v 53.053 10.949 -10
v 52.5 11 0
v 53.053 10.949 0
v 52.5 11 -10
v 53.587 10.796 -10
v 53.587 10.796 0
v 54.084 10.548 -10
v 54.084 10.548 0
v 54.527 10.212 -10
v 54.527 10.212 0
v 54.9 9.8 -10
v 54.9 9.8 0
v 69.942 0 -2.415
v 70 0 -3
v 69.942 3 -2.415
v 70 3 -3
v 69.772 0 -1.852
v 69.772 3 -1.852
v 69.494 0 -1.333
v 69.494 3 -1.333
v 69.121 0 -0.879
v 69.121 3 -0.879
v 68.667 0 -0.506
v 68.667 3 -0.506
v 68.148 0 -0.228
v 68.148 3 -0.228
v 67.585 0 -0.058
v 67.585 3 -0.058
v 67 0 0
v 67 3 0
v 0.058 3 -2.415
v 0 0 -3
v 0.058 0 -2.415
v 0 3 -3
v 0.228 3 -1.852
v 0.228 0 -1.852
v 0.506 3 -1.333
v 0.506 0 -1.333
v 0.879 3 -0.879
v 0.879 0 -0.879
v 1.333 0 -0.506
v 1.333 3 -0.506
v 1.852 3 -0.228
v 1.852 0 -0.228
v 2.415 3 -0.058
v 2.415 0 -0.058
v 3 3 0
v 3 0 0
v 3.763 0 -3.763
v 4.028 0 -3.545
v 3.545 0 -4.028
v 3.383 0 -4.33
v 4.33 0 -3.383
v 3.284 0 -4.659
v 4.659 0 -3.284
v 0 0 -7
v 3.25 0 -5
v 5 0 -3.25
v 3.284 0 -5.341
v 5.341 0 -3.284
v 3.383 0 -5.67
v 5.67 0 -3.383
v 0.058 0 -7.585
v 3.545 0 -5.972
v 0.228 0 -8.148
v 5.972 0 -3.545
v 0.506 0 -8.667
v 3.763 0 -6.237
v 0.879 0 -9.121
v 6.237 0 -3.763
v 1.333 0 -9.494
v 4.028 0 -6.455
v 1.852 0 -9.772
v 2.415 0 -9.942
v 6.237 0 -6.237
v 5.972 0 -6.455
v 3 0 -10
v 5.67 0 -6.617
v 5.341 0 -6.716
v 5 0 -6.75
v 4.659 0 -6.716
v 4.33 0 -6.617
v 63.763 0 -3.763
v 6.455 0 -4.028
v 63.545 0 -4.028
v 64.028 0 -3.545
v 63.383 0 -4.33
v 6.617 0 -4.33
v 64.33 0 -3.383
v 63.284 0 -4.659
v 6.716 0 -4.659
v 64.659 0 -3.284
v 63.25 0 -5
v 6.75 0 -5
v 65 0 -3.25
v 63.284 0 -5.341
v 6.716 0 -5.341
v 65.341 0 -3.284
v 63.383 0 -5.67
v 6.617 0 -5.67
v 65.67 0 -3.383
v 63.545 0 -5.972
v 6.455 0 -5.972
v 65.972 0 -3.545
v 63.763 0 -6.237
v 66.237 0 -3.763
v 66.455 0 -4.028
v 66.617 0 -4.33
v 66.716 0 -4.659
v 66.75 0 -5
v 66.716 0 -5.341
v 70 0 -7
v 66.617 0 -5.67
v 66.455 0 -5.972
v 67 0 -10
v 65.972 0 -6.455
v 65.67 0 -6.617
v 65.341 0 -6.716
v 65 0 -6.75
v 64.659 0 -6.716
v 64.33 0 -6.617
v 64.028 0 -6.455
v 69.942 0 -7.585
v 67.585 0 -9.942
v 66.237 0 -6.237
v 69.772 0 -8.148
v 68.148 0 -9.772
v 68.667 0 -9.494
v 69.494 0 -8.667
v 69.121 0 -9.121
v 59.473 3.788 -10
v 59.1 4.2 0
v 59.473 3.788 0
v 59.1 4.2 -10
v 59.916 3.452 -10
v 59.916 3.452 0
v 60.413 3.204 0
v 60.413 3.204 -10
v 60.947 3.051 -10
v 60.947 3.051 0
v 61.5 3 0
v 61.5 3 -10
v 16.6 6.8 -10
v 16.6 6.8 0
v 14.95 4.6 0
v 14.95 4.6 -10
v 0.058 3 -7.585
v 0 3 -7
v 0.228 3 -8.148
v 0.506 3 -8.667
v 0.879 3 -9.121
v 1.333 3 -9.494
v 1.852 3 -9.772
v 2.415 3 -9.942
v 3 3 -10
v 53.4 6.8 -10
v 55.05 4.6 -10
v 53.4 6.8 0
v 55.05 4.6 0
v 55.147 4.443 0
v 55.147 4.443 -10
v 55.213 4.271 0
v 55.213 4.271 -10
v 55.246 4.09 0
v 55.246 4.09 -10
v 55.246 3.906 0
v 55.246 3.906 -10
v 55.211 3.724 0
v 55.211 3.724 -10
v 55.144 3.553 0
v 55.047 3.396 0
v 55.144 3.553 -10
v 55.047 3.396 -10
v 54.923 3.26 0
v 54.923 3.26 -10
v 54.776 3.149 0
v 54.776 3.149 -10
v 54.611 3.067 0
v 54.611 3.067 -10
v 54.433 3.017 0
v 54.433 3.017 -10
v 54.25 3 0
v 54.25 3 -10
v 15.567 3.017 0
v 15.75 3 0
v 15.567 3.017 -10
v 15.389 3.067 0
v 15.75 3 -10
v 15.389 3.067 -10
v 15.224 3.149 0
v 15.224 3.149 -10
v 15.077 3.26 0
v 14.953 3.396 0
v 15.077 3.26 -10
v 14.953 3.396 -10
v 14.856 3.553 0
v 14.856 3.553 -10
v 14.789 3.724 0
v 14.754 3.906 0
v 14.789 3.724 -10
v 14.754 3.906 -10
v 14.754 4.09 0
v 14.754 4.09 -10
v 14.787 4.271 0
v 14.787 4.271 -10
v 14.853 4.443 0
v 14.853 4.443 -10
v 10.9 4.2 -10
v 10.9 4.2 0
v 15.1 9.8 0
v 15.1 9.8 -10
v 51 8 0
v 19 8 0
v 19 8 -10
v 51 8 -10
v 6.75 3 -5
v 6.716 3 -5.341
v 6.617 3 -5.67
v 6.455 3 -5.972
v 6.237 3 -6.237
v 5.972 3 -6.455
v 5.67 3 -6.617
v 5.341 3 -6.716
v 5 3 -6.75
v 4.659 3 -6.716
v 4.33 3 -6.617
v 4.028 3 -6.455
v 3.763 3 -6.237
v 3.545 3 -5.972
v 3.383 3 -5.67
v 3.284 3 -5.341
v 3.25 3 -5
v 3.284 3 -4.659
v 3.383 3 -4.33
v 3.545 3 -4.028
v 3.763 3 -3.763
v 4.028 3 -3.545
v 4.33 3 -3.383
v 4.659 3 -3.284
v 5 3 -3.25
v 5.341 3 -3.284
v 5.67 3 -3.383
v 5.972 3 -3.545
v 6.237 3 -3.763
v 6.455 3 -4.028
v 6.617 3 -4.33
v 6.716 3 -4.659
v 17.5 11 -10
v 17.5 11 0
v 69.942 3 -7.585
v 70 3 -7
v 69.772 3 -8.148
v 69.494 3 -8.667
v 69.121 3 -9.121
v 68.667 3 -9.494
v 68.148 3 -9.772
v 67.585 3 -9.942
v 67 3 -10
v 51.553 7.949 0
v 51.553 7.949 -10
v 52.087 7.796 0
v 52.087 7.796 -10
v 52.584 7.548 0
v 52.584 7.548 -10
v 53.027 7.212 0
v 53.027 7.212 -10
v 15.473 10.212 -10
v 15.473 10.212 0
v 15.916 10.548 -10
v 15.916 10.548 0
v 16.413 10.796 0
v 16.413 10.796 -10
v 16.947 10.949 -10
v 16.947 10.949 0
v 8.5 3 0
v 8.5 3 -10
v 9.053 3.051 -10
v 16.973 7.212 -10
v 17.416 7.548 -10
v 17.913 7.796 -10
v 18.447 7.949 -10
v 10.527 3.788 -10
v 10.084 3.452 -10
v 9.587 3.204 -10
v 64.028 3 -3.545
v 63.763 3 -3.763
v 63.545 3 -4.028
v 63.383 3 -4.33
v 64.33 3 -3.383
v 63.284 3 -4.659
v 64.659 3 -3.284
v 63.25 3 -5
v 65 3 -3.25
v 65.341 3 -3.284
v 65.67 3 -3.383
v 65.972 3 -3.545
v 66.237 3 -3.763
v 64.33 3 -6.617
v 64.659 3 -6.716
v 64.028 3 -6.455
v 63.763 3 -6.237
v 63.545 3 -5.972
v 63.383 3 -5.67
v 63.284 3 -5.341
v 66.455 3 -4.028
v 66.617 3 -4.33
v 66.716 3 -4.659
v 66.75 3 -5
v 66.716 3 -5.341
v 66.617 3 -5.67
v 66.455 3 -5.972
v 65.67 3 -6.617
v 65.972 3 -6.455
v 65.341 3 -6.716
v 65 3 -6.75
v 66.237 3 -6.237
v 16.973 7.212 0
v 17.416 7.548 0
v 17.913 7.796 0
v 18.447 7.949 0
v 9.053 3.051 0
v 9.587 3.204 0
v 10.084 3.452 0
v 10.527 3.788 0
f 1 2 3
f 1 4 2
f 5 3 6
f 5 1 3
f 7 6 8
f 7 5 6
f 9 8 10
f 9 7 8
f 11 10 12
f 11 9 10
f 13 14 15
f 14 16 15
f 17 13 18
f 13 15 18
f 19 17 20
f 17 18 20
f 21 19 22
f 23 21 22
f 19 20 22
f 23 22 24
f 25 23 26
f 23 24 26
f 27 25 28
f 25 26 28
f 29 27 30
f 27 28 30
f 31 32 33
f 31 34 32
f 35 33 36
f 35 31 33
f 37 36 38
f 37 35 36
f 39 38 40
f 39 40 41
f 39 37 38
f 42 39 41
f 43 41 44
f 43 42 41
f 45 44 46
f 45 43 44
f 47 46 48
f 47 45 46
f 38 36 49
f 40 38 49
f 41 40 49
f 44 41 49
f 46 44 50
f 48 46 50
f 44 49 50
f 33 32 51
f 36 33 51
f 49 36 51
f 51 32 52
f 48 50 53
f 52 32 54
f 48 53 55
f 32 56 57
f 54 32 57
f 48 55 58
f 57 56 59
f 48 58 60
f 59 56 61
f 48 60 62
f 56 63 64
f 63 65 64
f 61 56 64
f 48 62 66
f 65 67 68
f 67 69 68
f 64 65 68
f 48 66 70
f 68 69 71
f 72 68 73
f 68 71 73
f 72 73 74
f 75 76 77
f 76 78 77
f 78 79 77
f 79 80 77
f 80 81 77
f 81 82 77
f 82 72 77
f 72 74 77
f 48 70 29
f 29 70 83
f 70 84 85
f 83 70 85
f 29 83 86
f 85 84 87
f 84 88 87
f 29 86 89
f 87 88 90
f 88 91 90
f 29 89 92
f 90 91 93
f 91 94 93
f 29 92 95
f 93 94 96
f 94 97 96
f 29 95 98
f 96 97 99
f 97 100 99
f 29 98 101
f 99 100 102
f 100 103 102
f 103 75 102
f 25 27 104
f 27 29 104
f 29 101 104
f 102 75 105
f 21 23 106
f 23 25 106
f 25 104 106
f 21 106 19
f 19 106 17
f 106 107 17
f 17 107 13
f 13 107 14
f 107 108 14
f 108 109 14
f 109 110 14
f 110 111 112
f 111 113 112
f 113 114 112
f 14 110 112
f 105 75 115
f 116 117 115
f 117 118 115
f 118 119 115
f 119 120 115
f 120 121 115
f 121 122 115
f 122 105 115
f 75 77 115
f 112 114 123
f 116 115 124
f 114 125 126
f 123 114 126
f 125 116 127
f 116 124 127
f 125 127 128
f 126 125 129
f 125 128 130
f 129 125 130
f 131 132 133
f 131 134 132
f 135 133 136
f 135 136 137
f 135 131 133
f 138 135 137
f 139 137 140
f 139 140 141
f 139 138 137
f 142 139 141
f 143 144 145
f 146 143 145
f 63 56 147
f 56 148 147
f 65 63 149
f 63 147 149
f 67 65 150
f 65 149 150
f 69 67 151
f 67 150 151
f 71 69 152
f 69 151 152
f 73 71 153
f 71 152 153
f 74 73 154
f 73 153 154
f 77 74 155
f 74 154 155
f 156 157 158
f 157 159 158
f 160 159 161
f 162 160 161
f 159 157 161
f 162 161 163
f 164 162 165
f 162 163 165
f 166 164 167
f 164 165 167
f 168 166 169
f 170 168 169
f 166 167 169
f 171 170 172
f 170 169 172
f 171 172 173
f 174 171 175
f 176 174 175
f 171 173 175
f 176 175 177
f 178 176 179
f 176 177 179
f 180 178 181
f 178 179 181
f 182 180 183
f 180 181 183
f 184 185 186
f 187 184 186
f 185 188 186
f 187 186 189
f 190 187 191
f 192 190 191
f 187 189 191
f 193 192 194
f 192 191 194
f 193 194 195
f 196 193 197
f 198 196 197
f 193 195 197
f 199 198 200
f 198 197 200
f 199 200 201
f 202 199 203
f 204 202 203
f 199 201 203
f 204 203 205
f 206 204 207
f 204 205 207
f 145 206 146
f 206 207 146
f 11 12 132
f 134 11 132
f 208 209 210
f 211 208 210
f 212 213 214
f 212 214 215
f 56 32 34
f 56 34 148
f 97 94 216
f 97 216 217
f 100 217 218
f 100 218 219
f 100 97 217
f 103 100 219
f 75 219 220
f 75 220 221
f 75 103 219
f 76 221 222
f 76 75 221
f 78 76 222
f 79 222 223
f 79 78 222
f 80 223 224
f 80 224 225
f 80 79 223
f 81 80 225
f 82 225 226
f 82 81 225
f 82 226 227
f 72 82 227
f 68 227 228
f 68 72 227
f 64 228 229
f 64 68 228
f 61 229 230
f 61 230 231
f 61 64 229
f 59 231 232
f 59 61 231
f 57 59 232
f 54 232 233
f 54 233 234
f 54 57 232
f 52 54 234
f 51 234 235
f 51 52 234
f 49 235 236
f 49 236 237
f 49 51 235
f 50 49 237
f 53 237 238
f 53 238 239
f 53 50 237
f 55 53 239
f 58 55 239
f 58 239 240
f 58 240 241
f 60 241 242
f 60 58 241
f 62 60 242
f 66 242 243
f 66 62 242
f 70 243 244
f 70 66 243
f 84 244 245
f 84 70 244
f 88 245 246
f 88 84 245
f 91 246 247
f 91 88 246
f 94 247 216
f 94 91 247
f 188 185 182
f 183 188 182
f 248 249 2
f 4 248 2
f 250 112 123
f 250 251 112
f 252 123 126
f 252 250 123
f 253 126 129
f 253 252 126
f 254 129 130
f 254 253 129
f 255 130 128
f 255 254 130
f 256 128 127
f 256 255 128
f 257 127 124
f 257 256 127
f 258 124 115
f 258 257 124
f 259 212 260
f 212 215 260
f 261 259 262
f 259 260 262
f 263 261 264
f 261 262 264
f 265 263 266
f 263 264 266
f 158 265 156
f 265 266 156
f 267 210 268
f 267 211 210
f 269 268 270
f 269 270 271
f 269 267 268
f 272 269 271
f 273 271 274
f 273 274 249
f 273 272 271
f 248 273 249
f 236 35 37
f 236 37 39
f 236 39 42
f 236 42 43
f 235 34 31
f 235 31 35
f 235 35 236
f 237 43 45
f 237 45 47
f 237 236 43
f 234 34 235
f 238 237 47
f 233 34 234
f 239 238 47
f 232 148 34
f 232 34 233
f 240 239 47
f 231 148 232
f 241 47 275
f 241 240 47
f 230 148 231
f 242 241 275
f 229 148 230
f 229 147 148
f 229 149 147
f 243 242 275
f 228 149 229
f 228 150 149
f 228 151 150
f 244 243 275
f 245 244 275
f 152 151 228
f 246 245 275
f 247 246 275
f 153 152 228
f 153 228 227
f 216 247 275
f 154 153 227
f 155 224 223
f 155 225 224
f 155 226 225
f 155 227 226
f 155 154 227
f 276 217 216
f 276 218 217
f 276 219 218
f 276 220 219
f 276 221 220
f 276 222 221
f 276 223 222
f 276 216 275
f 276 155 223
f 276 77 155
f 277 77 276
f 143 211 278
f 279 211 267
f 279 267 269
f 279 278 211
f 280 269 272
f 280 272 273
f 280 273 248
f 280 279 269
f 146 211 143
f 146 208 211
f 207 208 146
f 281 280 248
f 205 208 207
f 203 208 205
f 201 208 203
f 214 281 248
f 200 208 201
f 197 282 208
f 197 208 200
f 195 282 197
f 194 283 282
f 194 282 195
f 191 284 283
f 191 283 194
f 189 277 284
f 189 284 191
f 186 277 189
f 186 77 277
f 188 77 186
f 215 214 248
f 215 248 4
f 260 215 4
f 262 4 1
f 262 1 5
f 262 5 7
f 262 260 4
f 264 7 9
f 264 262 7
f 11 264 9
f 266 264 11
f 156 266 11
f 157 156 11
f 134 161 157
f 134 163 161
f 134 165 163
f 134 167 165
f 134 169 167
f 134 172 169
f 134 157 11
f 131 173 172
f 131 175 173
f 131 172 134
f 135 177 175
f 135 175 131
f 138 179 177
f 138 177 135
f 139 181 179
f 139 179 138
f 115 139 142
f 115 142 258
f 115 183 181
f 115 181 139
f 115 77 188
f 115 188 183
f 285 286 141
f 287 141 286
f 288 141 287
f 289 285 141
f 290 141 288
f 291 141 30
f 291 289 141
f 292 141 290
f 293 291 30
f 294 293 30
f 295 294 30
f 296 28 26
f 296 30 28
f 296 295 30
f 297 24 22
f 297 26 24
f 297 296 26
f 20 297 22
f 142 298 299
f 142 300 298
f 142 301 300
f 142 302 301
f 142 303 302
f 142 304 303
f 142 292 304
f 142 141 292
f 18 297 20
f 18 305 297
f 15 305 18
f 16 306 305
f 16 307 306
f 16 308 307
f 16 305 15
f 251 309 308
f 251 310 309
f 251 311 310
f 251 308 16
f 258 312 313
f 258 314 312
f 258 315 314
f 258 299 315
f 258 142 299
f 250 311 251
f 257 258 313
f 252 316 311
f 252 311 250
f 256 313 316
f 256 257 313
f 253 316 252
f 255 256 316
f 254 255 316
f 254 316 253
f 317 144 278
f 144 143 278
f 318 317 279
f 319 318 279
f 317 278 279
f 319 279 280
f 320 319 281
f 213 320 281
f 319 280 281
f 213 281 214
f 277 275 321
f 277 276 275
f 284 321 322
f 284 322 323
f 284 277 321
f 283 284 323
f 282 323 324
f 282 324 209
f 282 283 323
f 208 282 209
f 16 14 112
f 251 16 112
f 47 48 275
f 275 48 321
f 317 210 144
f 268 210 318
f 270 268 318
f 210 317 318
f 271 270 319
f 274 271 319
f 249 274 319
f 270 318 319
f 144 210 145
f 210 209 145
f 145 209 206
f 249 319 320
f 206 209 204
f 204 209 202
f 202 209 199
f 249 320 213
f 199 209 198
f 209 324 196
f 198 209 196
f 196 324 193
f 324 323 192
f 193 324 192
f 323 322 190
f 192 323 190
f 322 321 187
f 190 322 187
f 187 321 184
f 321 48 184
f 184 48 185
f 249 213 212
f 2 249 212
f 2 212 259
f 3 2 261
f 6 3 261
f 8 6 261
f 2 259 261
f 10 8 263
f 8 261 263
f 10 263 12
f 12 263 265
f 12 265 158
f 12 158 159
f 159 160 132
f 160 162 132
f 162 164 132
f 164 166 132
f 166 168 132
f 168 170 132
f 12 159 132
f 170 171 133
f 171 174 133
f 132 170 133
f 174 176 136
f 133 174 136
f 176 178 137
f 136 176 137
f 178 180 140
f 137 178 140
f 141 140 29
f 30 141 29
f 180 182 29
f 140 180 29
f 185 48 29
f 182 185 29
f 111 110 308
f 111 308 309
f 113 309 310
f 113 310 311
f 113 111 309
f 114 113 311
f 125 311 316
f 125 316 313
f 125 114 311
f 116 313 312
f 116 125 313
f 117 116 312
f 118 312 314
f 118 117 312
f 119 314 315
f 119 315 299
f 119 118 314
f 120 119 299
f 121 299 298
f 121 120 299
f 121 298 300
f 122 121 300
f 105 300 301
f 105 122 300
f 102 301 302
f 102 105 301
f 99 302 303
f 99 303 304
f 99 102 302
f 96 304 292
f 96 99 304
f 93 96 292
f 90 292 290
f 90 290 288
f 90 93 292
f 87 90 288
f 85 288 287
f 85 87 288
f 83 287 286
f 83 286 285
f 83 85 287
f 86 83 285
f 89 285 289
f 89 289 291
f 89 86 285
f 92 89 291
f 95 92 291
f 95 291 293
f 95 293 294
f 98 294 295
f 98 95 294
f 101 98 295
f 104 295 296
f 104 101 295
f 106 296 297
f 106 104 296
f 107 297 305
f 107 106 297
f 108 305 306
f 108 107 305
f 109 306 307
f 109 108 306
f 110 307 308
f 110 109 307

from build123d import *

# Parameters (mm, degrees)
SKETCH1_W           = 70
SKETCH1_H           = 10
SKETCH1_R           = 1.75
BOSS_EXTRUDE1_DEPTH = 3
EXTRUDE_THIN1_DEPTH = 10
CUT_EXTRUDE1_REACH  = 12
FILLET1_R           = 3
FILLET2_R           = 1


with BuildPart() as part:
    # Sketch1 → Boss-Extrude1 (new body)
    with BuildSketch(Plane(origin=(0, 0, 0), x_dir=(1, 0, 0), z_dir=(0, 1, 0))):
        with Locations((35, 5)):
            Rectangle(SKETCH1_W, SKETCH1_H)
        with Locations((5, 5)):
            Circle(SKETCH1_R, mode=Mode.SUBTRACT)
        with Locations((65, 5)):
            Circle(SKETCH1_R, mode=Mode.SUBTRACT)
    extrude(amount=BOSS_EXTRUDE1_DEPTH)

    # Sketch2 → Extrude-Thin1 (add)
    with BuildSketch(Plane.XY):
        Polygon((10, 3), (16, 11), (54, 11), (60, 3), align=None)
        Polygon((16, 6), (17.5, 8), (52.5, 8), (54, 6), align=None, mode=Mode.SUBTRACT)
    extrude(amount=-EXTRUDE_THIN1_DEPTH)

    # Sketch3 → Cut-Extrude1 (cut, up to next)
    with BuildSketch(Plane.XY, mode=Mode.PRIVATE) as cut_extrude1_sk1:
        Polygon((16, 6), (13.75, 3), (56.25, 3), (54, 6), align=None)
    cut_extrude1_tool1 = extrude(cut_extrude1_sk1.sketch, amount=-CUT_EXTRUDE1_REACH, mode=Mode.PRIVATE) & part.part
    add(cut_extrude1_tool1.solids().sort_by_distance((35, 4.47205, 0))[0], mode=Mode.SUBTRACT)

    # Fillet1
    fillet1_edges = [part.edges().sort_by_distance(p)[0] for p in [
        (54, 11, -5),
        (16, 11, -5),
        (10, 3, -5),
        (60, 3, -5),
        (52.5, 8, -5),
        (17.5, 8, -5),
        (0, 1.5, -10),
        (70, 1.5, -10),
        (70, 1.5, 0),
        (0, 1.5, 0),
    ]]
    fillet(fillet1_edges, radius=FILLET1_R)

    # Fillet2
    fillet2_edges = [part.edges().sort_by_distance(p)[0] for p in [
        (56.25, 3, -5),
        (13.75, 3, -5),
    ]]
    fillet(fillet2_edges, radius=FILLET2_R)


solid = part.part
